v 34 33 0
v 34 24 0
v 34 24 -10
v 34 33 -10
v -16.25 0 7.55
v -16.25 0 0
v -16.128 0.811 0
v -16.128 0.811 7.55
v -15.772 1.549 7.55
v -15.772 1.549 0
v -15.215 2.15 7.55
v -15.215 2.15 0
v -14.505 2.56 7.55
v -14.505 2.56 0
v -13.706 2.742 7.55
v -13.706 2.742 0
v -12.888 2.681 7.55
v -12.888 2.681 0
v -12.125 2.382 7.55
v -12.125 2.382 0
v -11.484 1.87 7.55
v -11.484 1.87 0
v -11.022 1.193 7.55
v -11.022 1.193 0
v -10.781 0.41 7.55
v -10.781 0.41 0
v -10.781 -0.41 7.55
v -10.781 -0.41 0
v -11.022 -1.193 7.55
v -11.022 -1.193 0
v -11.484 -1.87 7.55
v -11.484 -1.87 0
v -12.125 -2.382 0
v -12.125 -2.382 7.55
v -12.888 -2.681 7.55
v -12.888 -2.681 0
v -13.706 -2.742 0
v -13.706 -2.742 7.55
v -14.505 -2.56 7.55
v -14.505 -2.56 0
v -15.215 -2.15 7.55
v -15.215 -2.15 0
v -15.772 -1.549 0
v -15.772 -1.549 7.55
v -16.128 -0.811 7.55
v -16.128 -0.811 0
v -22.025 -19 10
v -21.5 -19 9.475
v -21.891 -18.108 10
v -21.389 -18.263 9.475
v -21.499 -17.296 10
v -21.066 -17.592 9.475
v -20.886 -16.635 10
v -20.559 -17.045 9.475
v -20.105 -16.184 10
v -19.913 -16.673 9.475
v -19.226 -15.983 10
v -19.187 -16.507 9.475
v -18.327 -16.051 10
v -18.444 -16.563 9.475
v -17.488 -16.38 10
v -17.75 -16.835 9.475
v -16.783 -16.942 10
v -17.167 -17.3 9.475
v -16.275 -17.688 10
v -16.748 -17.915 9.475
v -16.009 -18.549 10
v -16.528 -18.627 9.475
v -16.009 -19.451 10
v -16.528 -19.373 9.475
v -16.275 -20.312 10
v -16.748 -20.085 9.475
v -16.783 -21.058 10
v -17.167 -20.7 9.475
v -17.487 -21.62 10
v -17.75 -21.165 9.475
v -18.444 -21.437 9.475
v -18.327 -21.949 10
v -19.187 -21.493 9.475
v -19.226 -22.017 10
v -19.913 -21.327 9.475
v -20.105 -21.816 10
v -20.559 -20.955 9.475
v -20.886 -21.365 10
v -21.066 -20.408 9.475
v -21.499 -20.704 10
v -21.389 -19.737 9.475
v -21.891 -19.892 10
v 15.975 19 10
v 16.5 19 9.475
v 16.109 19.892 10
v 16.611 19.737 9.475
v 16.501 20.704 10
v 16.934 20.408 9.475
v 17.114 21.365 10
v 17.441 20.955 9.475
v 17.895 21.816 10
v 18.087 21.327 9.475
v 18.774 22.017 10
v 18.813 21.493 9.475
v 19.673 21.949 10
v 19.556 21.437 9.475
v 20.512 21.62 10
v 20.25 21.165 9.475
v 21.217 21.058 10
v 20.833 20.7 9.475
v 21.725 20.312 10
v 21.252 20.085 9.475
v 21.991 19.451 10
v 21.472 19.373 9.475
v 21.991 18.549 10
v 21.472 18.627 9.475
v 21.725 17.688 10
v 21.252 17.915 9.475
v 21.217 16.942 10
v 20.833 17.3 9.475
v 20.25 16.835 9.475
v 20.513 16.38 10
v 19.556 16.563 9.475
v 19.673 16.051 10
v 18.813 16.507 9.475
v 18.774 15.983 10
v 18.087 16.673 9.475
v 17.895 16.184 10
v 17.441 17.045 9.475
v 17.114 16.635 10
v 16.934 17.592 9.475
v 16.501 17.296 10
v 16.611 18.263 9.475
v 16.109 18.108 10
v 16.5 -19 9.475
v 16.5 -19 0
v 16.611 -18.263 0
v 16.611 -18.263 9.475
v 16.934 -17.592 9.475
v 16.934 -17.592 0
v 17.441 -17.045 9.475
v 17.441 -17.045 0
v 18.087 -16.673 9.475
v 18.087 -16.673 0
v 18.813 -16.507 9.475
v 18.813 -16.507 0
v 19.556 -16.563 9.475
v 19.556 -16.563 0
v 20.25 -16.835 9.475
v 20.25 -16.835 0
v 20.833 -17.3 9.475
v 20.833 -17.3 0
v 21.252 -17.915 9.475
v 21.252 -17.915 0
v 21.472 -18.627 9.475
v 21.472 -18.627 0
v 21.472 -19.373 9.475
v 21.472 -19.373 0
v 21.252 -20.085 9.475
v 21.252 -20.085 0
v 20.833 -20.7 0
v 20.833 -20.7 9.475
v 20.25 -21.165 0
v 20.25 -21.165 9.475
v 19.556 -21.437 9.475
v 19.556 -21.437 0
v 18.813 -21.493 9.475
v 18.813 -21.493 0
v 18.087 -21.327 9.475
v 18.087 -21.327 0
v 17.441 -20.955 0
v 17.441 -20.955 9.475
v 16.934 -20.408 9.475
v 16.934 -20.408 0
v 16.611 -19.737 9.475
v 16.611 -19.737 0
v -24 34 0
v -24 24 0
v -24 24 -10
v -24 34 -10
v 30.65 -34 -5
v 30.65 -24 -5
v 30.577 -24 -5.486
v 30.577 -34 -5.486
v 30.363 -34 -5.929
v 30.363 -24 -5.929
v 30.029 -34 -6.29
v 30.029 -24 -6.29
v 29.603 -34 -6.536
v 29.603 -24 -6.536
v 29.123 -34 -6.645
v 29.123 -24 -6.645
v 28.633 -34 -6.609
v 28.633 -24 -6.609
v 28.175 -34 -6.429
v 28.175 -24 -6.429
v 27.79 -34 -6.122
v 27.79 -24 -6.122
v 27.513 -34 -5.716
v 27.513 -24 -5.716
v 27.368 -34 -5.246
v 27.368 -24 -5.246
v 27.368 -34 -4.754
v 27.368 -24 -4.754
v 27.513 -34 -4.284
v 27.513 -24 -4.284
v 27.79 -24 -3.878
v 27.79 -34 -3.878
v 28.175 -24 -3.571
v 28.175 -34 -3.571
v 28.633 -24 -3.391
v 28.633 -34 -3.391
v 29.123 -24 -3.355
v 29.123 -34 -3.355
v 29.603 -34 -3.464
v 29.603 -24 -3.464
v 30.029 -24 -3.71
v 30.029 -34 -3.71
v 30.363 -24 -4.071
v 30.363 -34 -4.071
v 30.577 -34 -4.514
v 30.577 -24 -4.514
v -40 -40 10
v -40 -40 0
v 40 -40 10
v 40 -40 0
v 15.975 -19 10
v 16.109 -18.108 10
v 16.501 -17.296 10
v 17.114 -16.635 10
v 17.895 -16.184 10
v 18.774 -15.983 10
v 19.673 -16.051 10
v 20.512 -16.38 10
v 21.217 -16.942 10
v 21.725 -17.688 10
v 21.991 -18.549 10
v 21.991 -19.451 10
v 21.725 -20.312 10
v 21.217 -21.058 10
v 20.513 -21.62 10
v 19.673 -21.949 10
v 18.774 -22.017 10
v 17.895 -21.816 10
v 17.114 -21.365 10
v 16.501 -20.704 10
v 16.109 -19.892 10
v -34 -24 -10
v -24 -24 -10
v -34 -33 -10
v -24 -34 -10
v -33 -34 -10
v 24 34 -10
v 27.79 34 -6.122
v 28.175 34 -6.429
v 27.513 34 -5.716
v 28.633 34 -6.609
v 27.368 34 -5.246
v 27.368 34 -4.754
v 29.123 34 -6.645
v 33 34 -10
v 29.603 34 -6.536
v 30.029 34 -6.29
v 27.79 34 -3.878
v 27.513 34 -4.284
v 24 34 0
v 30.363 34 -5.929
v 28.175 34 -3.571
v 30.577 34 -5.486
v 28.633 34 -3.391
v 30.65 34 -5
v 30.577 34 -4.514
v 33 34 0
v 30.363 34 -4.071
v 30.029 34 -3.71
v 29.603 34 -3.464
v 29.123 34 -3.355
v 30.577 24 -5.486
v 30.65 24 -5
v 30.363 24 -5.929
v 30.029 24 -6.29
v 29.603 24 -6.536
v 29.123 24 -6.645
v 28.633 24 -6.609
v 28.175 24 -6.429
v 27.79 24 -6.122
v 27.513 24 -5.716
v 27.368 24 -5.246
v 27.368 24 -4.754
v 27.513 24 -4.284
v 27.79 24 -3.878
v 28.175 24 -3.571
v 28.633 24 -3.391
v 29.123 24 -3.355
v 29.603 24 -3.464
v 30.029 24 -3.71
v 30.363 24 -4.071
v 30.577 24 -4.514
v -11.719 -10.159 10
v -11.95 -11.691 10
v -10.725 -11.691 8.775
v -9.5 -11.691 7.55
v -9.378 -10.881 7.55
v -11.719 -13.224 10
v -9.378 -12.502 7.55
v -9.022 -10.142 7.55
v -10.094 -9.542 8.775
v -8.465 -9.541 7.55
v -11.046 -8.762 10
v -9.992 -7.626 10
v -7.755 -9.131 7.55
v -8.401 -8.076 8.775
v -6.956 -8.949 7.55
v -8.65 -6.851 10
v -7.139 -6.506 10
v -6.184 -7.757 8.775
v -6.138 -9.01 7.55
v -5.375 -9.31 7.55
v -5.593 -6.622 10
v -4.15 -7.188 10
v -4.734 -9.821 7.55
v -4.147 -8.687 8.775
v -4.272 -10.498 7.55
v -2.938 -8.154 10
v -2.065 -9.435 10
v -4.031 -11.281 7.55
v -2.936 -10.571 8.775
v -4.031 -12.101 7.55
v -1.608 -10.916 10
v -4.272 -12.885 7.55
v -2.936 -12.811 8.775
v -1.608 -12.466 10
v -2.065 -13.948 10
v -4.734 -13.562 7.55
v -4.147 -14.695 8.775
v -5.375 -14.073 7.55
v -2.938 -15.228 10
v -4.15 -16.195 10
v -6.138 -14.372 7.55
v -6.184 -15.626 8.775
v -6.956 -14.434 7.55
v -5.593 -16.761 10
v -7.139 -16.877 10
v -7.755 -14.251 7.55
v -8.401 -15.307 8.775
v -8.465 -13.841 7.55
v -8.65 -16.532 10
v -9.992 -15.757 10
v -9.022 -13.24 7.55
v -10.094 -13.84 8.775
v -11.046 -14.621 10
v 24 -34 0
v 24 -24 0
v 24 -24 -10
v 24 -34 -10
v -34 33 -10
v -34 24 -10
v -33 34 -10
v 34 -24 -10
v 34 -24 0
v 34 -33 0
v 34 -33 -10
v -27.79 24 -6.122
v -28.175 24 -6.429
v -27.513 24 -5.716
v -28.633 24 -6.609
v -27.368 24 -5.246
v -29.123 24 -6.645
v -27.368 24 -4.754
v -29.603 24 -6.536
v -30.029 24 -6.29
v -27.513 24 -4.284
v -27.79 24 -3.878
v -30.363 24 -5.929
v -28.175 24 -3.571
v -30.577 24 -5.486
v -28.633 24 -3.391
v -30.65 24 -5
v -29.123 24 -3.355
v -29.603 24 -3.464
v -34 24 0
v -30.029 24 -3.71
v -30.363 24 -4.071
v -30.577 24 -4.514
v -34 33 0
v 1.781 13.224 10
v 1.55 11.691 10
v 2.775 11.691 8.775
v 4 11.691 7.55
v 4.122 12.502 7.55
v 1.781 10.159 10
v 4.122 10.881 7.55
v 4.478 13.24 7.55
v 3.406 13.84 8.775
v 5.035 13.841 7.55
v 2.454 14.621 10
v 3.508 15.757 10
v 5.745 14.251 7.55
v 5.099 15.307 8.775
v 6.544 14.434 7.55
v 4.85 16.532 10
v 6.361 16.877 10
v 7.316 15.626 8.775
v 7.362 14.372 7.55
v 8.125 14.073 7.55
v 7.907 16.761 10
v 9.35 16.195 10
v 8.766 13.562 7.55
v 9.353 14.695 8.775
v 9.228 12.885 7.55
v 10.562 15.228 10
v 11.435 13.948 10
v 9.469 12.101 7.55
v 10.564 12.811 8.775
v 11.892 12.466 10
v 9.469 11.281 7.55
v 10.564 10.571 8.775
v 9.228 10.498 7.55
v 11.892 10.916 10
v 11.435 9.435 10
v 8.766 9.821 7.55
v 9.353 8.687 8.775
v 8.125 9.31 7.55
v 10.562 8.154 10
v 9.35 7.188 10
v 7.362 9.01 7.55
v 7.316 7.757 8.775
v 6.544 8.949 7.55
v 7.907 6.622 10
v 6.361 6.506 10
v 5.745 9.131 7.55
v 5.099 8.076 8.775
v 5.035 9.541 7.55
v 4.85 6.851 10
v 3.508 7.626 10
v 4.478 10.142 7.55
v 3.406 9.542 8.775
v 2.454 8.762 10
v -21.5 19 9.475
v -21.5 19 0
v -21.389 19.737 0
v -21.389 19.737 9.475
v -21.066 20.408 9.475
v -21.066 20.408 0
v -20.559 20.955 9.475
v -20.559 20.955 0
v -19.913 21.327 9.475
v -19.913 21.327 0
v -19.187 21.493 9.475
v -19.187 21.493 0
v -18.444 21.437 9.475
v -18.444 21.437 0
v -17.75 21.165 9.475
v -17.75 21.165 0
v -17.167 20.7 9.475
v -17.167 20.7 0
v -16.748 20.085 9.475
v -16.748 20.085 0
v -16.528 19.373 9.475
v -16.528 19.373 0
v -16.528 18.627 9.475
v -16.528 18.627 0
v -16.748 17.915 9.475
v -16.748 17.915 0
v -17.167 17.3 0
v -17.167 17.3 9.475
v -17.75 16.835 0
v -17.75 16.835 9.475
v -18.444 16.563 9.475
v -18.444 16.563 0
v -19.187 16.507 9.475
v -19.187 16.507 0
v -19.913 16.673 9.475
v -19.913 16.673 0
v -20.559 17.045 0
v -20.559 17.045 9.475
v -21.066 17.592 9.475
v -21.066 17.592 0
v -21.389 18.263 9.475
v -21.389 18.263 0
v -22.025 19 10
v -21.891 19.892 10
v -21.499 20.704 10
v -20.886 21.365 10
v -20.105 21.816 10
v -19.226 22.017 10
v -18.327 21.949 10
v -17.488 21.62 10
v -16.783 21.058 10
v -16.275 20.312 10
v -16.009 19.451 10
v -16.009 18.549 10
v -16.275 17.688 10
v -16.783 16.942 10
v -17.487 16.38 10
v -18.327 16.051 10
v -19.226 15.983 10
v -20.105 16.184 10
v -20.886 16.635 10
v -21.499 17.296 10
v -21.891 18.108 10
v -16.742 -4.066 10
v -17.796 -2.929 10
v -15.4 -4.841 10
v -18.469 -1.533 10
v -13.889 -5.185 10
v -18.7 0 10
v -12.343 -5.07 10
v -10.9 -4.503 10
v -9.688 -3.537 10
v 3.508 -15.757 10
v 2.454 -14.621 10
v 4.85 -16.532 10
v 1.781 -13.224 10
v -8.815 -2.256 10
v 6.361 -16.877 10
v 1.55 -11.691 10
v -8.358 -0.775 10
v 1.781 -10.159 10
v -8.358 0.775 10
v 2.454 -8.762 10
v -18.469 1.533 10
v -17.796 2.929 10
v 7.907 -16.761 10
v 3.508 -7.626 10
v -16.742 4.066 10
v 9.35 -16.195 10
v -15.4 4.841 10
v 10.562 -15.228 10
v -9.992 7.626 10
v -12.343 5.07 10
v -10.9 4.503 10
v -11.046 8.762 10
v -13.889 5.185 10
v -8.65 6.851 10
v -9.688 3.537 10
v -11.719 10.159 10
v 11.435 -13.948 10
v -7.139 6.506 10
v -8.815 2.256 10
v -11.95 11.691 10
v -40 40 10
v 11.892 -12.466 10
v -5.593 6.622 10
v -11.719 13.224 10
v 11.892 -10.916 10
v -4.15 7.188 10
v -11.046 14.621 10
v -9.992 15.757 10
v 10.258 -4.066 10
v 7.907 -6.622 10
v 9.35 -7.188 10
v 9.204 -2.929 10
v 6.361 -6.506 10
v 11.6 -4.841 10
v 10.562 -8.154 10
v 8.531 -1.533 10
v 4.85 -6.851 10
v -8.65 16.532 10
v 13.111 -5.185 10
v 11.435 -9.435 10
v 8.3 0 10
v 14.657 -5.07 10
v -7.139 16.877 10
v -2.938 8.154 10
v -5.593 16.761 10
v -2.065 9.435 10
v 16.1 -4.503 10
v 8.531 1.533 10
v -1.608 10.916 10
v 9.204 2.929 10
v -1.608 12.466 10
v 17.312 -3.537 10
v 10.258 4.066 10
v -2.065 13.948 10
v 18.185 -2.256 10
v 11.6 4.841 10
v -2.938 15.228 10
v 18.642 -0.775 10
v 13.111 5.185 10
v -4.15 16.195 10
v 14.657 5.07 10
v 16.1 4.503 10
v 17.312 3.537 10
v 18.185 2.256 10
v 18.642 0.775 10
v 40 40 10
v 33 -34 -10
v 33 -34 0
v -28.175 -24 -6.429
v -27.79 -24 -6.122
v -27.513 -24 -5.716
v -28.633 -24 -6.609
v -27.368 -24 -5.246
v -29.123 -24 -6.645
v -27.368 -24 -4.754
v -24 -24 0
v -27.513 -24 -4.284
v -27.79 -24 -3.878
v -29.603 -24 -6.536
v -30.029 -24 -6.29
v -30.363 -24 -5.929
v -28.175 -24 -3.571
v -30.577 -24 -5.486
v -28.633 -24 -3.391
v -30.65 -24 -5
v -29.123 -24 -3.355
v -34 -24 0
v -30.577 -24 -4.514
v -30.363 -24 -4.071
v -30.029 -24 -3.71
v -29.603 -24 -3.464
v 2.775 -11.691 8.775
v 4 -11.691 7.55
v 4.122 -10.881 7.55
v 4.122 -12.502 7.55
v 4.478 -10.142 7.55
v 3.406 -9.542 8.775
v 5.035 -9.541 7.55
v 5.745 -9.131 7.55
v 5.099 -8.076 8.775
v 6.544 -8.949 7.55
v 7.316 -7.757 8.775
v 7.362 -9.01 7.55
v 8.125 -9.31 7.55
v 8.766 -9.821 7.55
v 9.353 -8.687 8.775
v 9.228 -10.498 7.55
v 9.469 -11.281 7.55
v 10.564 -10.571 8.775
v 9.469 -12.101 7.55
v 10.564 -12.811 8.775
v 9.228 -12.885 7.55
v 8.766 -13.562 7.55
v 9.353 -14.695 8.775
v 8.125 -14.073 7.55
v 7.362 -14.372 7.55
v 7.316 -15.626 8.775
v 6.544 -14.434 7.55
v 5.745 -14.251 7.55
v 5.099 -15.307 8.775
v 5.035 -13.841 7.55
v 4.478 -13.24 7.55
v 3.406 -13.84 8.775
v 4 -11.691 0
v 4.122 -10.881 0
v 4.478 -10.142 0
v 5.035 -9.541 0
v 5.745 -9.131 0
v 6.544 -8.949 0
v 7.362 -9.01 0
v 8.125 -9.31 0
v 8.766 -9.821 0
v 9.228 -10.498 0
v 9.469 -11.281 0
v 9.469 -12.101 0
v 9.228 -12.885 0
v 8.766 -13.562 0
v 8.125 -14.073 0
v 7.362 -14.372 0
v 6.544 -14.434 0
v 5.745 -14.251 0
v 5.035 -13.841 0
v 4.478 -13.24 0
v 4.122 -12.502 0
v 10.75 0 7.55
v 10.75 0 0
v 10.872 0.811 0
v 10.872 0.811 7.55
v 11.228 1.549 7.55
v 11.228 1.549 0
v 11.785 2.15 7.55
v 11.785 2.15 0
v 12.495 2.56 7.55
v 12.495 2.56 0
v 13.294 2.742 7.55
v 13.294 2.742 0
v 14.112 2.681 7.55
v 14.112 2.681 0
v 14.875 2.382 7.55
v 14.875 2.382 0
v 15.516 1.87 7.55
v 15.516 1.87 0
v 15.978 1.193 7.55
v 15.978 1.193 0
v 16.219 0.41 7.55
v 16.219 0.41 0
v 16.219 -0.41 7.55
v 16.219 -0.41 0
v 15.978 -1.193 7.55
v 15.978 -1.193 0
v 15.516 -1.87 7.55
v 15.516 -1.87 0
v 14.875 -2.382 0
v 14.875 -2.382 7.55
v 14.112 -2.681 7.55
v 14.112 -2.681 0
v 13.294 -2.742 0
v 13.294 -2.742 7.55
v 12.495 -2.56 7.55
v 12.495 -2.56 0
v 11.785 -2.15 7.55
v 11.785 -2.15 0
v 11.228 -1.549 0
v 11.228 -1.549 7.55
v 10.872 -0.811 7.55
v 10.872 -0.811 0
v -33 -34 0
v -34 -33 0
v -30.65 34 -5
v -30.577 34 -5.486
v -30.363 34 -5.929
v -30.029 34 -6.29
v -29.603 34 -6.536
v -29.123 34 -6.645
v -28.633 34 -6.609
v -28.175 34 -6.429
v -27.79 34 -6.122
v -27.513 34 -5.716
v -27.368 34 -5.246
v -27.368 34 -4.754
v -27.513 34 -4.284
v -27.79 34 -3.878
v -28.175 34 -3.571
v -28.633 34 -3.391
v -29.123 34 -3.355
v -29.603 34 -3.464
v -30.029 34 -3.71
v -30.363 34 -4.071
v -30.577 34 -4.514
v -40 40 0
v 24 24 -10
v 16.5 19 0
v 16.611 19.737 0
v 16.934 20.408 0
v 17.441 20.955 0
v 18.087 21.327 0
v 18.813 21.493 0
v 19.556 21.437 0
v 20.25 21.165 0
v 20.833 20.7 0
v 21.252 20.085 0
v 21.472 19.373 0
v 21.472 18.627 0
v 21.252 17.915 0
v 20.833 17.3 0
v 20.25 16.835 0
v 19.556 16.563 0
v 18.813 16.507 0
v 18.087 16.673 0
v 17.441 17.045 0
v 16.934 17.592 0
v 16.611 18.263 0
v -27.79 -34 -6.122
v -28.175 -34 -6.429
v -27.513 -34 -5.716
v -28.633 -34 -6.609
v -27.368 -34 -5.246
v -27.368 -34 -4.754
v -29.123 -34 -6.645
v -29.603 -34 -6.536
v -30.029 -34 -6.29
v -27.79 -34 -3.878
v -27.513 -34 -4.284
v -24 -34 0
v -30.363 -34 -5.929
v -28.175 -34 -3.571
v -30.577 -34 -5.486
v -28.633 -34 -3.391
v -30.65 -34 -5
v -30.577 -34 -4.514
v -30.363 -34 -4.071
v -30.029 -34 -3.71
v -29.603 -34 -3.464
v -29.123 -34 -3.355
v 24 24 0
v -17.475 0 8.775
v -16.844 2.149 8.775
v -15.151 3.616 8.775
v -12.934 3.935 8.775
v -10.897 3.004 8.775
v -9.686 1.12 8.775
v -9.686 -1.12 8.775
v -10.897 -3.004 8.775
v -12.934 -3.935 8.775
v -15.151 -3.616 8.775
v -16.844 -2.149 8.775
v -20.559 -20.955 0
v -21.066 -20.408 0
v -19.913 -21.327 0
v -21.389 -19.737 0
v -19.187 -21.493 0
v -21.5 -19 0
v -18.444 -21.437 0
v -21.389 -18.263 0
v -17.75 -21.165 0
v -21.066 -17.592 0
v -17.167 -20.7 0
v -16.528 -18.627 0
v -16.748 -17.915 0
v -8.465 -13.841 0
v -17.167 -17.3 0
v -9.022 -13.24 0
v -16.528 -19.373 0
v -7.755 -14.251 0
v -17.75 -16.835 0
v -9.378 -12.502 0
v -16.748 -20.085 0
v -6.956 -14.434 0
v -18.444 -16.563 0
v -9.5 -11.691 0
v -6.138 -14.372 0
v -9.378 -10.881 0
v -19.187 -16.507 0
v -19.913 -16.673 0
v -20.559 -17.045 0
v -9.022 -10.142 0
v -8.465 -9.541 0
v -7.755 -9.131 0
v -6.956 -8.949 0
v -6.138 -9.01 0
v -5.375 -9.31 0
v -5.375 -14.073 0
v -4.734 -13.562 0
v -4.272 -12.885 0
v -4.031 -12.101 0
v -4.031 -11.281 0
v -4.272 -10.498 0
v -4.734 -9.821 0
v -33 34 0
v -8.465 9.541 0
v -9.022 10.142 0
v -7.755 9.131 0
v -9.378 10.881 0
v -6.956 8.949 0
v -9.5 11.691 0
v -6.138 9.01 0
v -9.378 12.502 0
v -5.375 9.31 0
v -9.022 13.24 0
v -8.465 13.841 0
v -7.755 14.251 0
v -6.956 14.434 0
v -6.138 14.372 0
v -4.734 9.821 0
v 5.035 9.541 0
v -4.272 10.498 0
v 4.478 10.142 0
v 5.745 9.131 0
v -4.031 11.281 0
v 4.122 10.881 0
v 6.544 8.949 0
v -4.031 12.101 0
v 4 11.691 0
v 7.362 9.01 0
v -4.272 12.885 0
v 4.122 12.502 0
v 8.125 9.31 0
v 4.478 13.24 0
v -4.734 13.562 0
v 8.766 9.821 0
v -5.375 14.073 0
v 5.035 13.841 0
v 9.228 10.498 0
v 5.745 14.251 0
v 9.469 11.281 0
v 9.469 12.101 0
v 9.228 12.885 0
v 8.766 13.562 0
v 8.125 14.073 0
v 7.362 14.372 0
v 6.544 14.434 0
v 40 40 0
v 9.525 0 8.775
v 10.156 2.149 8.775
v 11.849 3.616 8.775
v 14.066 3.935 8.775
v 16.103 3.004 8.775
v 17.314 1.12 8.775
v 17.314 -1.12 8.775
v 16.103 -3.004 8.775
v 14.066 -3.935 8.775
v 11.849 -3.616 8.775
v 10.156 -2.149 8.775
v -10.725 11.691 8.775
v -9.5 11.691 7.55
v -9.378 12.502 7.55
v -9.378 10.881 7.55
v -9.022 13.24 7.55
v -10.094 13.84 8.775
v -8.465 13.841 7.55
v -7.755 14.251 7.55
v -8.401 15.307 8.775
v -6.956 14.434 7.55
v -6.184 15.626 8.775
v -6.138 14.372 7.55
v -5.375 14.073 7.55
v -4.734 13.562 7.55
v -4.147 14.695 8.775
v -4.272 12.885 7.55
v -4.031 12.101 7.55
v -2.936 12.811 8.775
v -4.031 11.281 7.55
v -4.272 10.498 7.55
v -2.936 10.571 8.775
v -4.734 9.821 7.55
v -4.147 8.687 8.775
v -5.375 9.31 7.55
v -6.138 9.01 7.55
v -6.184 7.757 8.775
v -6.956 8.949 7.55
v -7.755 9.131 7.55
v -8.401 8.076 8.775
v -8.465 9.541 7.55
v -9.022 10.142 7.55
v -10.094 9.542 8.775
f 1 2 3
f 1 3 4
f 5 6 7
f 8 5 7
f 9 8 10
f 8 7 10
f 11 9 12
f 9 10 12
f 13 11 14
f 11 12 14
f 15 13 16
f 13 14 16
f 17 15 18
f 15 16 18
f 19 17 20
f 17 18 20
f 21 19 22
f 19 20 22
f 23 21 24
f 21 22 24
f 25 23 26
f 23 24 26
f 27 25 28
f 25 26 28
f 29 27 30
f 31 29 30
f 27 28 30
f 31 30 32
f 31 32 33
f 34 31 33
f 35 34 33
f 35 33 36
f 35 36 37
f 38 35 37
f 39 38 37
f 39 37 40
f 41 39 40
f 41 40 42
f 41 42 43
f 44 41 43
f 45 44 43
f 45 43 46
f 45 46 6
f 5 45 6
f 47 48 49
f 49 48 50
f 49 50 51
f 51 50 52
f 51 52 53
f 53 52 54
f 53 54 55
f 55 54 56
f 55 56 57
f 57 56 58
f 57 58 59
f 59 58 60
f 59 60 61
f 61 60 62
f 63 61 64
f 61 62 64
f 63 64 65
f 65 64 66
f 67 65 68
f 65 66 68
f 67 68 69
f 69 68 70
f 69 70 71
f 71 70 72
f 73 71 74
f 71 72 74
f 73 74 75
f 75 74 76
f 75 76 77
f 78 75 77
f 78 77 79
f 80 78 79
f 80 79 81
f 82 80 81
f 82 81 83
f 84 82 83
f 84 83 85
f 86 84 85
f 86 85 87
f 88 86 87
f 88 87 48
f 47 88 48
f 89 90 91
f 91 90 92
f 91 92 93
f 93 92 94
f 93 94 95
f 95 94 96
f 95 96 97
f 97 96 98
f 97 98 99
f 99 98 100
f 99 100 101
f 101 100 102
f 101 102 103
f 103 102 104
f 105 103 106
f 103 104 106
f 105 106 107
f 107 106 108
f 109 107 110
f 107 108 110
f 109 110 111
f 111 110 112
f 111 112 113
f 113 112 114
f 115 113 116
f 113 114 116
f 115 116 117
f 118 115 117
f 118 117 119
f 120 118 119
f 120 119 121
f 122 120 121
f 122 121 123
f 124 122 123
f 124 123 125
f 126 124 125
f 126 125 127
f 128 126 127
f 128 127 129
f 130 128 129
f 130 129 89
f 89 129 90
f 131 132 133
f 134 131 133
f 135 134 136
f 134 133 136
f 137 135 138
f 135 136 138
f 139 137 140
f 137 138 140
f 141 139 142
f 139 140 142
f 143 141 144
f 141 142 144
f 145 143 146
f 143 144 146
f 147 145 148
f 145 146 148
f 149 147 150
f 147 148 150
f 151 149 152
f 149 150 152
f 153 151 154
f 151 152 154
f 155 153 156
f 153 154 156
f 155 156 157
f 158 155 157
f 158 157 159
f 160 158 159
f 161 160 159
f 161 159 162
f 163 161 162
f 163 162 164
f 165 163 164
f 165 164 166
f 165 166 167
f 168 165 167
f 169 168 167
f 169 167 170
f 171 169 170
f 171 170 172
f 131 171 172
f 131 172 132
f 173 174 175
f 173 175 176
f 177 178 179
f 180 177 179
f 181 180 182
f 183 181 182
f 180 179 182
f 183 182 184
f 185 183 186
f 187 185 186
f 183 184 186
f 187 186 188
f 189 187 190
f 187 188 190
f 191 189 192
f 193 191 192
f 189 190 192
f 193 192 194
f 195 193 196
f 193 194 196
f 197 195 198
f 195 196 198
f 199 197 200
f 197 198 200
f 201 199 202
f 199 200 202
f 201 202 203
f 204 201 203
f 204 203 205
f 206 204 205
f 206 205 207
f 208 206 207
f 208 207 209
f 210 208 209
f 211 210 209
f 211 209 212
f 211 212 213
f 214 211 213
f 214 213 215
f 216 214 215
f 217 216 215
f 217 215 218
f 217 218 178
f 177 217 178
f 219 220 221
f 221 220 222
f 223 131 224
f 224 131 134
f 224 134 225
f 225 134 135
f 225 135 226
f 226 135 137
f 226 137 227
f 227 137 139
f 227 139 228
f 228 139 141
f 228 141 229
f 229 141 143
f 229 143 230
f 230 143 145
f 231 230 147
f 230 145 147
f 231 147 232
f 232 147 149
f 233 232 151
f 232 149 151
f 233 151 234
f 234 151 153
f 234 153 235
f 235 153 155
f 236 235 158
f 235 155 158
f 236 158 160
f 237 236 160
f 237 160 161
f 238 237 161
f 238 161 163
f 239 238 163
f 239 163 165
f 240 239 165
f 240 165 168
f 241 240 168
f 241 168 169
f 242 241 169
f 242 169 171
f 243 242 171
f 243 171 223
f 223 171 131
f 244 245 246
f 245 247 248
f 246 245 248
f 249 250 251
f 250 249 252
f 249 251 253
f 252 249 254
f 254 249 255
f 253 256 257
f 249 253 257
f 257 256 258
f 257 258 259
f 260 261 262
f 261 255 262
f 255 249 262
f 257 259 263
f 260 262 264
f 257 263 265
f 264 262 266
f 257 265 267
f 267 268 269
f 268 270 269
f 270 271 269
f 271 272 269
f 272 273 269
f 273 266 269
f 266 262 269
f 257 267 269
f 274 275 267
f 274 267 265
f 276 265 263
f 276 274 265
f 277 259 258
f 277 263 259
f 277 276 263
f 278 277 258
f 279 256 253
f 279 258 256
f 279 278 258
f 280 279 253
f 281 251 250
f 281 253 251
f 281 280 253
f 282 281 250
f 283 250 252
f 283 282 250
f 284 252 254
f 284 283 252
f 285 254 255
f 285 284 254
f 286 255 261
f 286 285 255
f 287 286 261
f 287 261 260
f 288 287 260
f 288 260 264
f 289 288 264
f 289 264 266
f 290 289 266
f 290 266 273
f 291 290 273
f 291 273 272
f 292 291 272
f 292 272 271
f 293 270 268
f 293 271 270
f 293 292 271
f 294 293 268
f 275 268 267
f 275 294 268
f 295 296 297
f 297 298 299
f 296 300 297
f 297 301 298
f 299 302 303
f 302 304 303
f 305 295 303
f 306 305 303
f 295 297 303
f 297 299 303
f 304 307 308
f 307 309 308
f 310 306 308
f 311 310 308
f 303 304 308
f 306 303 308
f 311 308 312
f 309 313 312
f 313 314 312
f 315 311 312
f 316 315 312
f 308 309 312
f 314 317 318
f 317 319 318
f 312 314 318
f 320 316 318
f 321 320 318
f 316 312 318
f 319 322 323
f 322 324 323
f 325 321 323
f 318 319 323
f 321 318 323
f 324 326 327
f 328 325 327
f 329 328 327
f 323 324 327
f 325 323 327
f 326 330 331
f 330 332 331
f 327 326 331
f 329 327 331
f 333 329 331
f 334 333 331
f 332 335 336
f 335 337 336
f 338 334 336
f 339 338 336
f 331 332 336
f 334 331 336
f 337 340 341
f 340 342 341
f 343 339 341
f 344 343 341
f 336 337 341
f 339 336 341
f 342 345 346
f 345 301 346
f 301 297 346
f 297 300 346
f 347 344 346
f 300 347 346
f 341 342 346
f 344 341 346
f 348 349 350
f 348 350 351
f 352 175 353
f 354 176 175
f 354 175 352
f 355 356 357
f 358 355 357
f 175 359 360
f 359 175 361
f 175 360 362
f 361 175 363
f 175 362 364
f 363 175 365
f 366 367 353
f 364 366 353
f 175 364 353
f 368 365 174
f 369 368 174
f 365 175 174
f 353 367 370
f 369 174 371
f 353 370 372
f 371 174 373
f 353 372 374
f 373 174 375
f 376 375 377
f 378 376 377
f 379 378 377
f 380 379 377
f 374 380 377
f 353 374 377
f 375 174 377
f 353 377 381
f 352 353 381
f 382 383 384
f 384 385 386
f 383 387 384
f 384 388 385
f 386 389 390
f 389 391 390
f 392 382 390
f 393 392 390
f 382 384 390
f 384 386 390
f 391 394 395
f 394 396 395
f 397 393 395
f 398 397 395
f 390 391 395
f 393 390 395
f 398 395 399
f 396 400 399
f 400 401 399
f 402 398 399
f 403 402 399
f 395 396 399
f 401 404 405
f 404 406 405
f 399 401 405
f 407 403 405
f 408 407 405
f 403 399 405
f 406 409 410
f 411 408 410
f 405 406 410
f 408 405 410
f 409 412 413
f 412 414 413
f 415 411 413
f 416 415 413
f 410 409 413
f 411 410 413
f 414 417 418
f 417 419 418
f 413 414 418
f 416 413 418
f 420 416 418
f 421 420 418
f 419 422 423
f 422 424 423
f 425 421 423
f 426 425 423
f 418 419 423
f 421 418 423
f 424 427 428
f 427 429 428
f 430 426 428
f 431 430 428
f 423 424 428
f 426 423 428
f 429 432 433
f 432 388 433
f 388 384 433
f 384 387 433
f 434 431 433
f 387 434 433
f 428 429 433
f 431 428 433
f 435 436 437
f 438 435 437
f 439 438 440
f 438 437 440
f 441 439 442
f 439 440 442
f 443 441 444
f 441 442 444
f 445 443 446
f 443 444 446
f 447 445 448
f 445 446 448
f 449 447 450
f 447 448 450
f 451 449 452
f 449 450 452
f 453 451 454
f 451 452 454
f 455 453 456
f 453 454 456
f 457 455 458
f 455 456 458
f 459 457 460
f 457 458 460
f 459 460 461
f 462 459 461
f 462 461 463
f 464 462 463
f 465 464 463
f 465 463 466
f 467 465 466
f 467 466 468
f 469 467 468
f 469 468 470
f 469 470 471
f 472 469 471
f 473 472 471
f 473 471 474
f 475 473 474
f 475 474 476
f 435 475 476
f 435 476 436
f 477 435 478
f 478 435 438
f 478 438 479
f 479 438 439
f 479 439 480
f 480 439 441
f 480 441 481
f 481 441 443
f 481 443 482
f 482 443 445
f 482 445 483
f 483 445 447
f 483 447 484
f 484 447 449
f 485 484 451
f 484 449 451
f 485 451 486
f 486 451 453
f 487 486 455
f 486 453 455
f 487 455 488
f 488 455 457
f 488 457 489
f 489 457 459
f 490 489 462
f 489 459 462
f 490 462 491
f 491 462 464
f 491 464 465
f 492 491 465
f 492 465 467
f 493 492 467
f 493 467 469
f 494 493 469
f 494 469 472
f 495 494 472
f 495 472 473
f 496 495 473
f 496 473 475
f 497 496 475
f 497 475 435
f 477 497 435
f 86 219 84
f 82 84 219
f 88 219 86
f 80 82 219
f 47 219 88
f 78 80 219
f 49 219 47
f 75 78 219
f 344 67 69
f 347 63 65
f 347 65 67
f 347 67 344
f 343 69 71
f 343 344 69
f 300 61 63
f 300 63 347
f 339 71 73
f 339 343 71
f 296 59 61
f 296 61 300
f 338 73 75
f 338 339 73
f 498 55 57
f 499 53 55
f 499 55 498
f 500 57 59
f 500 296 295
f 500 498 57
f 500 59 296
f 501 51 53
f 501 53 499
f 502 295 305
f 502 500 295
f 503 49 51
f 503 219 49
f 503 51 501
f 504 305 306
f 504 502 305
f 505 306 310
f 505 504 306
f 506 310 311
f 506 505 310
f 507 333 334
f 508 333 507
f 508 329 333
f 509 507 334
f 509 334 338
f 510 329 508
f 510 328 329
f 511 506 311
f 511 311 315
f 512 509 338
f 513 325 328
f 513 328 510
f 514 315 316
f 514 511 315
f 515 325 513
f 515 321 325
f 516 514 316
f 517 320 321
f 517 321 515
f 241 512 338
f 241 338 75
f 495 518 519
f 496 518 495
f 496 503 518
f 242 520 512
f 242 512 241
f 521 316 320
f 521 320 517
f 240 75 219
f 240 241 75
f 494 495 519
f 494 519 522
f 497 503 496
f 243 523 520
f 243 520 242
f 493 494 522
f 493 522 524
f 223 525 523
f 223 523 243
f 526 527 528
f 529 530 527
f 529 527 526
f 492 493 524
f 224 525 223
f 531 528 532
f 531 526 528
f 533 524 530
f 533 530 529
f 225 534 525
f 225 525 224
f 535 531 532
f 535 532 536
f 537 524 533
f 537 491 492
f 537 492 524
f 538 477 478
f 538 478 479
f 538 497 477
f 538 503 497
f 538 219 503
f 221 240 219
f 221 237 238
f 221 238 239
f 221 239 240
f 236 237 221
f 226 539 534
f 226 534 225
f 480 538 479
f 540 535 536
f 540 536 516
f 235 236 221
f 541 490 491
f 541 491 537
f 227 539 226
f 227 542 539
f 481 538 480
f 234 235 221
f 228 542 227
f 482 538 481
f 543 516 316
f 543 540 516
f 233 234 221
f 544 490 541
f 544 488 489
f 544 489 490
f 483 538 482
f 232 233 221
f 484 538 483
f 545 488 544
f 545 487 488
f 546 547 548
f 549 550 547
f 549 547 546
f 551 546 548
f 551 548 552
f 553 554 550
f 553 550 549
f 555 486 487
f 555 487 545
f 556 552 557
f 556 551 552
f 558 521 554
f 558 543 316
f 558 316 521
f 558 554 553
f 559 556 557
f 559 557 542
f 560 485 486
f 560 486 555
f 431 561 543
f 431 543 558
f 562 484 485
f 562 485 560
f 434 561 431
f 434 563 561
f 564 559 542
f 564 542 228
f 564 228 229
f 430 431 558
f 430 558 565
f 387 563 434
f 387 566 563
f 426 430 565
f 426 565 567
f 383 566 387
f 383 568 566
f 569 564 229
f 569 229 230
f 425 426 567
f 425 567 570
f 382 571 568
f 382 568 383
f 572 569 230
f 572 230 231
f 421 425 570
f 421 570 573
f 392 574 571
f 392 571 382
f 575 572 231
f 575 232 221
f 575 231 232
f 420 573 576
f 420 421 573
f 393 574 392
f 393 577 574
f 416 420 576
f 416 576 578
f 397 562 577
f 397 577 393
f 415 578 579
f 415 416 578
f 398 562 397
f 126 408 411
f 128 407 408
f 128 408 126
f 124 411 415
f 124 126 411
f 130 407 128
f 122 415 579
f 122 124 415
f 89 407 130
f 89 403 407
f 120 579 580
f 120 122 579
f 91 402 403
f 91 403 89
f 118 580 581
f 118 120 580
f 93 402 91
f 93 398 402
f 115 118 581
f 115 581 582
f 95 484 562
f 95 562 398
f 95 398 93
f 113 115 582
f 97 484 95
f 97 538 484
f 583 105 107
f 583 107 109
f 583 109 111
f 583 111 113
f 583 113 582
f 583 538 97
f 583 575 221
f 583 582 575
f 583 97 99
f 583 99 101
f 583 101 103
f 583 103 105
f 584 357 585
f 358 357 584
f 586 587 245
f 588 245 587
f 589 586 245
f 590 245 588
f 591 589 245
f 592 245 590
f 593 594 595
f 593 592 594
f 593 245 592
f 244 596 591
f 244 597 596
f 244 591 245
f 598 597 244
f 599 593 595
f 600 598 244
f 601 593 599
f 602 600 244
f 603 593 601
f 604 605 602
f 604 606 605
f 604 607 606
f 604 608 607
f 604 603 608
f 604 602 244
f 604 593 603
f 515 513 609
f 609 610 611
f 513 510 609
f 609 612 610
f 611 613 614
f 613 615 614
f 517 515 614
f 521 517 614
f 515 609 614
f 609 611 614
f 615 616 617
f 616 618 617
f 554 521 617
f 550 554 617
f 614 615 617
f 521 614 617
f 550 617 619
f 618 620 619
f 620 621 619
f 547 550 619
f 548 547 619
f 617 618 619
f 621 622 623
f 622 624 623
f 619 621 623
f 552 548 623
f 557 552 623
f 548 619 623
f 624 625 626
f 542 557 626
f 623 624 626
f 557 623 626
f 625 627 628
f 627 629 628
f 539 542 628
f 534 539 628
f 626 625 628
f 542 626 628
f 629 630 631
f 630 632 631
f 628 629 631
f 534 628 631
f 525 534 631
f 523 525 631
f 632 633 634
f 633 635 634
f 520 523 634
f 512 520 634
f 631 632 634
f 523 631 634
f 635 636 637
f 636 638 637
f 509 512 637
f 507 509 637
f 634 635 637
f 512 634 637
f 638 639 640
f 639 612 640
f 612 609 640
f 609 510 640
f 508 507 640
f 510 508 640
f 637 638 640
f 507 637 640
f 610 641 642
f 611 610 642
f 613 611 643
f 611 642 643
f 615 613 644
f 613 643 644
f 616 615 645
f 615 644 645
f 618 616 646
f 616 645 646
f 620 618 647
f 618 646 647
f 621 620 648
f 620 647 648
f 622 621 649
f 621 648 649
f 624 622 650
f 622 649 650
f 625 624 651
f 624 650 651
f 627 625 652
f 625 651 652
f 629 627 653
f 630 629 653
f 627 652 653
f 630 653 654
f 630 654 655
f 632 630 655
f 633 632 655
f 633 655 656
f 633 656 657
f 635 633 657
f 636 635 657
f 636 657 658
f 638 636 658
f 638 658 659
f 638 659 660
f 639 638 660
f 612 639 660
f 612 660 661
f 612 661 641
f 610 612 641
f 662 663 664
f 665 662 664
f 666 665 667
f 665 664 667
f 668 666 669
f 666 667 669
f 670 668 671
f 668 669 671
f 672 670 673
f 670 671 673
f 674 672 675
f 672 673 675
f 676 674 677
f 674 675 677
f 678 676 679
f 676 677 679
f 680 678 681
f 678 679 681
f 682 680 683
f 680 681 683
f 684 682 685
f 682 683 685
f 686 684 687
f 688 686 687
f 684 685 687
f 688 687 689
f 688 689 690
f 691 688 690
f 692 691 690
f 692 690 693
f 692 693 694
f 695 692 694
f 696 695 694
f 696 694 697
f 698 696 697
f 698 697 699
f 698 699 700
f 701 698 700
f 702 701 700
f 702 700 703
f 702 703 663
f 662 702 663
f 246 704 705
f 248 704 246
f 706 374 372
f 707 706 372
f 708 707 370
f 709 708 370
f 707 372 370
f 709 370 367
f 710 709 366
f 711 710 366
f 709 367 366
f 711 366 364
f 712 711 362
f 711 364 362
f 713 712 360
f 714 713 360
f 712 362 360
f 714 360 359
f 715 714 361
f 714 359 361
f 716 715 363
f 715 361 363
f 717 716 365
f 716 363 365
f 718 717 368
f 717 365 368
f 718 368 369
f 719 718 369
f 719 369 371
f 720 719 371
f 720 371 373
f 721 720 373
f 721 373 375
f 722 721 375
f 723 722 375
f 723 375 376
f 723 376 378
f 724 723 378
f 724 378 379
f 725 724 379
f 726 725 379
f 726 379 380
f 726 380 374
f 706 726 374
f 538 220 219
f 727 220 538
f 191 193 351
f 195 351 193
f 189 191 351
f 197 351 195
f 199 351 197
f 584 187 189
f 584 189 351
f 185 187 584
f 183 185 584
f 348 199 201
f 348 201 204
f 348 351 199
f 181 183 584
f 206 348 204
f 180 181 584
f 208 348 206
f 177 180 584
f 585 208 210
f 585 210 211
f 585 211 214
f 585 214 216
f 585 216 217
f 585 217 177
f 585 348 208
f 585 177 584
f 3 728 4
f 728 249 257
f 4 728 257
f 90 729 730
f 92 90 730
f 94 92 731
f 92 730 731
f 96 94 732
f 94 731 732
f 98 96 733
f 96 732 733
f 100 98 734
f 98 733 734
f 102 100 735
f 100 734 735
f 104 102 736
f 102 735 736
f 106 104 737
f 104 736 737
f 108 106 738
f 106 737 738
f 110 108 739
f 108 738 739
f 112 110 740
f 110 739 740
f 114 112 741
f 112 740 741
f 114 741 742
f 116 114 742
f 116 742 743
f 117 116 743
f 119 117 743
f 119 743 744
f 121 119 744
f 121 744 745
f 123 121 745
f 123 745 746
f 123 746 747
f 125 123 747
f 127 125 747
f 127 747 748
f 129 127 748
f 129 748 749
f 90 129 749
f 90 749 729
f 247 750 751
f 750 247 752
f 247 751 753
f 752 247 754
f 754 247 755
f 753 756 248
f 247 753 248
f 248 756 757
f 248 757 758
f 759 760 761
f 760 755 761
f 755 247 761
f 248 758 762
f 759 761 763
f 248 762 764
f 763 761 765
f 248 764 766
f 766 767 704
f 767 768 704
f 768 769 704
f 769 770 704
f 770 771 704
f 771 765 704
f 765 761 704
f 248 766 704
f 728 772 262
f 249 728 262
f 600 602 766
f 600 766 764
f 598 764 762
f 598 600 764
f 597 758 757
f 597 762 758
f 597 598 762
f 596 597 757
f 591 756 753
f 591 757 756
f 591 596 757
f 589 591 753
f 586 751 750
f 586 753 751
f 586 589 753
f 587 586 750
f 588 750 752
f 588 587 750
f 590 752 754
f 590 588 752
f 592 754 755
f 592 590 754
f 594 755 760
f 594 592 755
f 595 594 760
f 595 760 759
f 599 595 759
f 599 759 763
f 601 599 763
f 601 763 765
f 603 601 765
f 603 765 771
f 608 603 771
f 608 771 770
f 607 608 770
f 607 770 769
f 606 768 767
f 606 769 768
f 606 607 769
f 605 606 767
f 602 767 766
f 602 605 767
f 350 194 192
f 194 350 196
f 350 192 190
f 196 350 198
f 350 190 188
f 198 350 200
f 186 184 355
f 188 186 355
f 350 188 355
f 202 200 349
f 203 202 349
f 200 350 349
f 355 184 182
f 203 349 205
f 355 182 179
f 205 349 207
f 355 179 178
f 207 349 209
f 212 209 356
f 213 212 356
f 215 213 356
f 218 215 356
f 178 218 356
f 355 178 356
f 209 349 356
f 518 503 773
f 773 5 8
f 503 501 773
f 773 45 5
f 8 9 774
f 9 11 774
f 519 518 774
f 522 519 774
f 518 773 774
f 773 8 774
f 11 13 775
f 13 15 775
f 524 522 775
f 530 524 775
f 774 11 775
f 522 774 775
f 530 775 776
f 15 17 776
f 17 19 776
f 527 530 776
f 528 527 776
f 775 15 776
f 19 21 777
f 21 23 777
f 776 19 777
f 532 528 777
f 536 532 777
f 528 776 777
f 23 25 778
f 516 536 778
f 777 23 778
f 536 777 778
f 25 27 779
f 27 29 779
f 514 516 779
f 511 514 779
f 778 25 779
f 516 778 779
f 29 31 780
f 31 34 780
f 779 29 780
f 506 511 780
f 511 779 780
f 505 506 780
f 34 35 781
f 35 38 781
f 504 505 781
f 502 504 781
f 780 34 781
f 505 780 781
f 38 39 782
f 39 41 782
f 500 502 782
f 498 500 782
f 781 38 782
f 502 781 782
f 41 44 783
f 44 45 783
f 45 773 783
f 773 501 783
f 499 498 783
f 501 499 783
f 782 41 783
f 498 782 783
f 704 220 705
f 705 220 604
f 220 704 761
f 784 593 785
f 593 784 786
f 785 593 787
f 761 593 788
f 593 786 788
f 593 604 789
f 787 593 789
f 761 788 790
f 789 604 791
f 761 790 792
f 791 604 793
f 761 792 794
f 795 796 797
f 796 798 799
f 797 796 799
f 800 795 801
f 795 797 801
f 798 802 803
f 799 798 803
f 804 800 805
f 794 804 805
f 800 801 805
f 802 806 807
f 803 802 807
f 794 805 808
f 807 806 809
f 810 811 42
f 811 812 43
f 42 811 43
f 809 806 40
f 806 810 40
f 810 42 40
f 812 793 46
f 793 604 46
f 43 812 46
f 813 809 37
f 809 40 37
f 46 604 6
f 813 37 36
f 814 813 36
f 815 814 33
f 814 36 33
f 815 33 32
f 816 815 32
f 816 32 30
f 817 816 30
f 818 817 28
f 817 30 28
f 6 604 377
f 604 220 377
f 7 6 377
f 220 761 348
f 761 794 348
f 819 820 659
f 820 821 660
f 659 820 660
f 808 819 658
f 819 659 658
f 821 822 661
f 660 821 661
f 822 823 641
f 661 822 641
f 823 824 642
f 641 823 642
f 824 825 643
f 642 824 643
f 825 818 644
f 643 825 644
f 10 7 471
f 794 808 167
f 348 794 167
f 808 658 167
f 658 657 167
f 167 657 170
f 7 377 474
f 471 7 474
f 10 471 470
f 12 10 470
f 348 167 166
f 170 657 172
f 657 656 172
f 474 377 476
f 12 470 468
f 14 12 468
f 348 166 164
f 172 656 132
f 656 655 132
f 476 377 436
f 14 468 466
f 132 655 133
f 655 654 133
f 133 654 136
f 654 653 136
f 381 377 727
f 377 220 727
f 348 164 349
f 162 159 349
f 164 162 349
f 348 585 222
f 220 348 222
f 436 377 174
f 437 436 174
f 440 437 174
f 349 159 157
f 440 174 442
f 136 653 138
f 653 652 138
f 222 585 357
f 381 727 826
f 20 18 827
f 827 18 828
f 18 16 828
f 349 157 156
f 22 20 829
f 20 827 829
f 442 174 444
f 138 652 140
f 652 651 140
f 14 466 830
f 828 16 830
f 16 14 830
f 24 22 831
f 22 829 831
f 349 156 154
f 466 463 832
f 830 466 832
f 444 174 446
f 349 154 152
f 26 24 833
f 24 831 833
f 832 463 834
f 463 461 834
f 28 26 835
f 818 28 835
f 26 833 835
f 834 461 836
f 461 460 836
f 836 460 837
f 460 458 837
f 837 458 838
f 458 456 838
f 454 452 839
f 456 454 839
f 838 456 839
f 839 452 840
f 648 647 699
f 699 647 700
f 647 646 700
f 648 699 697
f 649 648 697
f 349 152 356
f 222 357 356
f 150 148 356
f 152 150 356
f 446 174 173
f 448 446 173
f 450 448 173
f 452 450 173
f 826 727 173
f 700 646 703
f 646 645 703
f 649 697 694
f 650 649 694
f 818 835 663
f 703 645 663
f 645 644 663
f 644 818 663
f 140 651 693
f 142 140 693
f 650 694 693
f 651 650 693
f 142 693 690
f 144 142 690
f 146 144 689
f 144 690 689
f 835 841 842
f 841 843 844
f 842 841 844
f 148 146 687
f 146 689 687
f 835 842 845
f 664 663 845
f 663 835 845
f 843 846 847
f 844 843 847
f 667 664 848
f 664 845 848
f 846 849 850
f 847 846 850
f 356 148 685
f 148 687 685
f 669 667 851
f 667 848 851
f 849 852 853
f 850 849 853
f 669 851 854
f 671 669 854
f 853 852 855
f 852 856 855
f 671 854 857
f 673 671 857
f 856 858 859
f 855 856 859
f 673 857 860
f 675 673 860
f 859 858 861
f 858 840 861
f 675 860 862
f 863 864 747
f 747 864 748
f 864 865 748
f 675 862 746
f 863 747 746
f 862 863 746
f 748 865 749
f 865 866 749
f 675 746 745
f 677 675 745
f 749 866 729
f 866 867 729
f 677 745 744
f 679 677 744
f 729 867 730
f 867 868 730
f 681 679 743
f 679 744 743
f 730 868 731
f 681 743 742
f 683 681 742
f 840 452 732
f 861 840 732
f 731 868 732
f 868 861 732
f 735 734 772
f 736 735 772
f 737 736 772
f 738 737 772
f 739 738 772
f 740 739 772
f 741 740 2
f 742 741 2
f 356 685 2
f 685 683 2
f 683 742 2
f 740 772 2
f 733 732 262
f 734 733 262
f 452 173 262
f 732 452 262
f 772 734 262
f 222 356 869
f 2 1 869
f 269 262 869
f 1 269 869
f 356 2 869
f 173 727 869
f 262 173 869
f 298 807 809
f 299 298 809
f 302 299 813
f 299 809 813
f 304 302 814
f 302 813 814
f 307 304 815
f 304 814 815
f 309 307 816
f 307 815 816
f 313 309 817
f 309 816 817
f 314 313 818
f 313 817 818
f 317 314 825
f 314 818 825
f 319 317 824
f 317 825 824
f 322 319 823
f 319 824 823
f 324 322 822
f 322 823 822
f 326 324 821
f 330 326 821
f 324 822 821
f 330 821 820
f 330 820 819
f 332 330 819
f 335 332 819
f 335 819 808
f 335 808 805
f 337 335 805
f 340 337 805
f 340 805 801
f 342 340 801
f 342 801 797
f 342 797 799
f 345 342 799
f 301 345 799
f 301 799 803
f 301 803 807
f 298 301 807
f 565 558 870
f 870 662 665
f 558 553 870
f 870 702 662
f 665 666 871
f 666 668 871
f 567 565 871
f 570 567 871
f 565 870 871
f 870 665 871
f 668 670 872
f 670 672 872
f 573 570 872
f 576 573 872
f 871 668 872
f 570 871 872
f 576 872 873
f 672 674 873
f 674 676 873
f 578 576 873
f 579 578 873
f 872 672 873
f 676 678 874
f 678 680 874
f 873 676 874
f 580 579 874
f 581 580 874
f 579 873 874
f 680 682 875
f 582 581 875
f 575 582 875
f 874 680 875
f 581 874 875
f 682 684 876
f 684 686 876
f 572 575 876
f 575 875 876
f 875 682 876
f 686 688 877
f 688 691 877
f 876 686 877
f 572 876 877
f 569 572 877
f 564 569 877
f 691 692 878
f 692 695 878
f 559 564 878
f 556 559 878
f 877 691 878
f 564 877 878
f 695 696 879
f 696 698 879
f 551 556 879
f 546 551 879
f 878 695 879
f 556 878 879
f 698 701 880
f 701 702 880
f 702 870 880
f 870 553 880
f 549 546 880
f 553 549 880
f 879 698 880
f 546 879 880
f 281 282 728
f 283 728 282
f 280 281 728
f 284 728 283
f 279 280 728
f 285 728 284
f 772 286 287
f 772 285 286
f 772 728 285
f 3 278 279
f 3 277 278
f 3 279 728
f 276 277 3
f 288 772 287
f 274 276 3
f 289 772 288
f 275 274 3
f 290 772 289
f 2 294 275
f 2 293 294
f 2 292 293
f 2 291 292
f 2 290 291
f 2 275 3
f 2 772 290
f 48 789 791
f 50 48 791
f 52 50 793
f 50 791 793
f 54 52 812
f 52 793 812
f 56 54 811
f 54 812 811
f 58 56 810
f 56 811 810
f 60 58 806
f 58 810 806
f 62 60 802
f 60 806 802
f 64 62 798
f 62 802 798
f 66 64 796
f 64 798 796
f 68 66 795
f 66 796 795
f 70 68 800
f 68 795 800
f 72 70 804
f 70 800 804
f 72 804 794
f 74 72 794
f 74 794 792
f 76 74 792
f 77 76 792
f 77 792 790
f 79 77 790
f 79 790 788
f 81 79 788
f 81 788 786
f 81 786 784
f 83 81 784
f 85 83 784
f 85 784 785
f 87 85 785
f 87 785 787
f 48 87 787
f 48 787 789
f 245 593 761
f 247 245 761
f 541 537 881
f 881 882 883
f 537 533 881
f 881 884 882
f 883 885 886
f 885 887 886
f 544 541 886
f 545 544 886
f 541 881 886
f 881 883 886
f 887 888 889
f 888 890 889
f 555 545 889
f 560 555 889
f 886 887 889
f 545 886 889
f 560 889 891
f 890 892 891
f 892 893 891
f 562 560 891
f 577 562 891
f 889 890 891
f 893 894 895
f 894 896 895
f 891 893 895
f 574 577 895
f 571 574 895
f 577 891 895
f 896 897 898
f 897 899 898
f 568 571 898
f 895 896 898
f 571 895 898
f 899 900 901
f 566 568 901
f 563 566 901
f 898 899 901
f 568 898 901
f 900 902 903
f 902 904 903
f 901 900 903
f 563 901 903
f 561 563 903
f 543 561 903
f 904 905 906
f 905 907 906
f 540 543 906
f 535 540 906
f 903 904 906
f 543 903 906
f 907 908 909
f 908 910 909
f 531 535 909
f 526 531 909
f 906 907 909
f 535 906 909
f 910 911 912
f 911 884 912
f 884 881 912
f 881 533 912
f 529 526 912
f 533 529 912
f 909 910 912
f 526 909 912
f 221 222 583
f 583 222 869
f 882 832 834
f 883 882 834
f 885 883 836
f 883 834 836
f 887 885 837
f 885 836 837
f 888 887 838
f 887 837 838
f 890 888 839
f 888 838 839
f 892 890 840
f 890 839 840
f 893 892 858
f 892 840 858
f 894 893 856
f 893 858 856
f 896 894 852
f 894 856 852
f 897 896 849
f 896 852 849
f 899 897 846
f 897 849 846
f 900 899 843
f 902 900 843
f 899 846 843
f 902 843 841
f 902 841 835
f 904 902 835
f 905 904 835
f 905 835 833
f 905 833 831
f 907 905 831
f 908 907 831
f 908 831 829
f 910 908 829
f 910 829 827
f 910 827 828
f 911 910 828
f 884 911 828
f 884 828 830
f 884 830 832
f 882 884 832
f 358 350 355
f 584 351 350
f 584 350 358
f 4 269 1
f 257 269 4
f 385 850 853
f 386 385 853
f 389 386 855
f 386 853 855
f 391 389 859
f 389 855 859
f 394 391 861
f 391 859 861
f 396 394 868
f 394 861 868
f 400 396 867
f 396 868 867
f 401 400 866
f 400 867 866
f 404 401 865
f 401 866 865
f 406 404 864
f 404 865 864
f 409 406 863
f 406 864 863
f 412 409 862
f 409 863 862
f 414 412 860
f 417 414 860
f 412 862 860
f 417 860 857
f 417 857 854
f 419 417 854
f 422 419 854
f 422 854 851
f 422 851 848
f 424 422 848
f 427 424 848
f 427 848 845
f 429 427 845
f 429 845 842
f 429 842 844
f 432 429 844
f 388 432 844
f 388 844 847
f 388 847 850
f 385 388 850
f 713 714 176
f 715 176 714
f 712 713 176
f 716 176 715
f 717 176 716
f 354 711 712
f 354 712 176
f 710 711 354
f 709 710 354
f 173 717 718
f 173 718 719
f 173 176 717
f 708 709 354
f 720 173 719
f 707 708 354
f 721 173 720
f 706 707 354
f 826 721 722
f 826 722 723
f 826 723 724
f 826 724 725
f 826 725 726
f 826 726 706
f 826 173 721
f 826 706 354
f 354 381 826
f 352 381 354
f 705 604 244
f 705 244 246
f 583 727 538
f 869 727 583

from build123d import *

# Parameters (mm, degrees)
SKETCH_1_W                   = 80
SKETCH_1_H                   = 80
EXTRUDE_1_DEPTH              = 10
SKETCH_11_W                  = 10
SKETCH_11_H                  = 10
EXTRUDE_3_DEPTH              = 10
HOLE_WIZARD_M4_2_D           = 3.3
HOLE_WIZARD_M4_2_DEPTH       = 68
HOLE_WIZARD_M5_1_D           = 5.5
HOLE_WIZARD_M5_1_DEPTH       = 10
HOLE_WIZARD_M5_1_CSINK_D     = 10.4
HOLE_WIZARD_M5_1_CSINK_ANGLE = 90
HOLE_WIZARD_M6_1_D           = 5
HOLE_WIZARD_M6_1_DEPTH       = 10
HOLE_WIZARD_M6_1_CSINK_D     = 6.05
HOLE_WIZARD_M6_1_CSINK_ANGLE = 90
MIRROR_2_COPY_1_SKETCH_W     = 10
MIRROR_2_COPY_1_SKETCH_H     = 10
MIRROR_2_COPY_1_DEPTH        = 10
MIRROR_2_COPY_2_D            = 3.3
MIRROR_2_COPY_2_DEPTH        = 68
CHAMFER_1_SIZE               = 1


with BuildPart() as part:
    # 스케치1 → 보스-돌출1 (new body)
    with BuildSketch(Plane.XY):
        Rectangle(SKETCH_1_W, SKETCH_1_H)
    extrude(amount=EXTRUDE_1_DEPTH)

    # 스케치11 → 보스-돌출3 (add)
    with BuildSketch(Plane(origin=(0, 0, 0), x_dir=(-1, 0, 0), z_dir=(0, 0, -1))):
        with Locations((29, 29)):
            Rectangle(SKETCH_11_W, SKETCH_11_H)
    extrude_3 = extrude(amount=EXTRUDE_3_DEPTH)

    # M4 나사 구멍2
    with Locations(Plane(origin=(0, 34, 0), x_dir=(1, 0, 0), z_dir=(0, 1, 0))):
        with Locations((-29, 5)):
            hole_wizard_m4_2 = Hole(HOLE_WIZARD_M4_2_D / 2, depth=HOLE_WIZARD_M4_2_DEPTH)

    # M5 접시 머리 나사용 카운터싱크1
    with Locations(Plane.XY.offset(10)):
        with Locations((-6.75, 11.691342951), (-13.5, 0), (-6.75, -11.691342951), (6.75, -11.691342951), (13.5, 0), (6.75, 11.691342951)):
            CounterSinkHole(HOLE_WIZARD_M5_1_D / 2, HOLE_WIZARD_M5_1_CSINK_D / 2, depth=HOLE_WIZARD_M5_1_DEPTH, counter_sink_angle=HOLE_WIZARD_M5_1_CSINK_ANGLE)

    # M6 나사 구멍1
    with Locations(Plane.XY.offset(10)):
        with Locations((-19, -19), (19, -19), (19, 19), (-19, 19)):
            CounterSinkHole(HOLE_WIZARD_M6_1_D / 2, HOLE_WIZARD_M6_1_CSINK_D / 2, depth=HOLE_WIZARD_M6_1_DEPTH, counter_sink_angle=HOLE_WIZARD_M6_1_CSINK_ANGLE)

    # 대칭 복사1: 보스-돌출3, M4 나사 구멍2 across plane
    add(extrude_3.mirror(Plane(origin=(0, 0, 0), x_dir=(0, 0, 1), z_dir=(1, 0, 0))))
    add(hole_wizard_m4_2.mirror(Plane(origin=(0, 0, 0), x_dir=(0, 0, 1), z_dir=(1, 0, 0))), mode=Mode.SUBTRACT)

    # 대칭 복사2: 보스-돌출3, M4 나사 구멍2 across plane
    add(extrude_3.mirror(Plane.ZX))
    add(hole_wizard_m4_2.mirror(Plane.ZX), mode=Mode.SUBTRACT)

    # 대칭 복사2 copy 1 sketch → 대칭 복사2 copy 1 (add)
    with BuildSketch(Plane(origin=(0, 0, 0), x_dir=(1, 0, 0), z_dir=(0, 0, -1))):
        with Locations((29, 29)):
            Rectangle(MIRROR_2_COPY_1_SKETCH_W, MIRROR_2_COPY_1_SKETCH_H)
    extrude(amount=MIRROR_2_COPY_1_DEPTH)

    # 대칭 복사2 copy 2
    with Locations(Plane(origin=(0, -34, 0), x_dir=(-1, 0, 0), z_dir=(0, -1, 0))):
        with Locations((-29, 5)):
            Hole(MIRROR_2_COPY_2_D / 2, depth=MIRROR_2_COPY_2_DEPTH)

    # 모따기1
    chamfer_1_edges = [part.edges().sort_by_distance(p)[0] for p in [
        (34, 34, -5),
        (34, -34, -5),
        (-34, -34, -5),
        (-34, 34, -5),
    ]]
    chamfer(chamfer_1_edges, length=CHAMFER_1_SIZE)


solid = part.part
